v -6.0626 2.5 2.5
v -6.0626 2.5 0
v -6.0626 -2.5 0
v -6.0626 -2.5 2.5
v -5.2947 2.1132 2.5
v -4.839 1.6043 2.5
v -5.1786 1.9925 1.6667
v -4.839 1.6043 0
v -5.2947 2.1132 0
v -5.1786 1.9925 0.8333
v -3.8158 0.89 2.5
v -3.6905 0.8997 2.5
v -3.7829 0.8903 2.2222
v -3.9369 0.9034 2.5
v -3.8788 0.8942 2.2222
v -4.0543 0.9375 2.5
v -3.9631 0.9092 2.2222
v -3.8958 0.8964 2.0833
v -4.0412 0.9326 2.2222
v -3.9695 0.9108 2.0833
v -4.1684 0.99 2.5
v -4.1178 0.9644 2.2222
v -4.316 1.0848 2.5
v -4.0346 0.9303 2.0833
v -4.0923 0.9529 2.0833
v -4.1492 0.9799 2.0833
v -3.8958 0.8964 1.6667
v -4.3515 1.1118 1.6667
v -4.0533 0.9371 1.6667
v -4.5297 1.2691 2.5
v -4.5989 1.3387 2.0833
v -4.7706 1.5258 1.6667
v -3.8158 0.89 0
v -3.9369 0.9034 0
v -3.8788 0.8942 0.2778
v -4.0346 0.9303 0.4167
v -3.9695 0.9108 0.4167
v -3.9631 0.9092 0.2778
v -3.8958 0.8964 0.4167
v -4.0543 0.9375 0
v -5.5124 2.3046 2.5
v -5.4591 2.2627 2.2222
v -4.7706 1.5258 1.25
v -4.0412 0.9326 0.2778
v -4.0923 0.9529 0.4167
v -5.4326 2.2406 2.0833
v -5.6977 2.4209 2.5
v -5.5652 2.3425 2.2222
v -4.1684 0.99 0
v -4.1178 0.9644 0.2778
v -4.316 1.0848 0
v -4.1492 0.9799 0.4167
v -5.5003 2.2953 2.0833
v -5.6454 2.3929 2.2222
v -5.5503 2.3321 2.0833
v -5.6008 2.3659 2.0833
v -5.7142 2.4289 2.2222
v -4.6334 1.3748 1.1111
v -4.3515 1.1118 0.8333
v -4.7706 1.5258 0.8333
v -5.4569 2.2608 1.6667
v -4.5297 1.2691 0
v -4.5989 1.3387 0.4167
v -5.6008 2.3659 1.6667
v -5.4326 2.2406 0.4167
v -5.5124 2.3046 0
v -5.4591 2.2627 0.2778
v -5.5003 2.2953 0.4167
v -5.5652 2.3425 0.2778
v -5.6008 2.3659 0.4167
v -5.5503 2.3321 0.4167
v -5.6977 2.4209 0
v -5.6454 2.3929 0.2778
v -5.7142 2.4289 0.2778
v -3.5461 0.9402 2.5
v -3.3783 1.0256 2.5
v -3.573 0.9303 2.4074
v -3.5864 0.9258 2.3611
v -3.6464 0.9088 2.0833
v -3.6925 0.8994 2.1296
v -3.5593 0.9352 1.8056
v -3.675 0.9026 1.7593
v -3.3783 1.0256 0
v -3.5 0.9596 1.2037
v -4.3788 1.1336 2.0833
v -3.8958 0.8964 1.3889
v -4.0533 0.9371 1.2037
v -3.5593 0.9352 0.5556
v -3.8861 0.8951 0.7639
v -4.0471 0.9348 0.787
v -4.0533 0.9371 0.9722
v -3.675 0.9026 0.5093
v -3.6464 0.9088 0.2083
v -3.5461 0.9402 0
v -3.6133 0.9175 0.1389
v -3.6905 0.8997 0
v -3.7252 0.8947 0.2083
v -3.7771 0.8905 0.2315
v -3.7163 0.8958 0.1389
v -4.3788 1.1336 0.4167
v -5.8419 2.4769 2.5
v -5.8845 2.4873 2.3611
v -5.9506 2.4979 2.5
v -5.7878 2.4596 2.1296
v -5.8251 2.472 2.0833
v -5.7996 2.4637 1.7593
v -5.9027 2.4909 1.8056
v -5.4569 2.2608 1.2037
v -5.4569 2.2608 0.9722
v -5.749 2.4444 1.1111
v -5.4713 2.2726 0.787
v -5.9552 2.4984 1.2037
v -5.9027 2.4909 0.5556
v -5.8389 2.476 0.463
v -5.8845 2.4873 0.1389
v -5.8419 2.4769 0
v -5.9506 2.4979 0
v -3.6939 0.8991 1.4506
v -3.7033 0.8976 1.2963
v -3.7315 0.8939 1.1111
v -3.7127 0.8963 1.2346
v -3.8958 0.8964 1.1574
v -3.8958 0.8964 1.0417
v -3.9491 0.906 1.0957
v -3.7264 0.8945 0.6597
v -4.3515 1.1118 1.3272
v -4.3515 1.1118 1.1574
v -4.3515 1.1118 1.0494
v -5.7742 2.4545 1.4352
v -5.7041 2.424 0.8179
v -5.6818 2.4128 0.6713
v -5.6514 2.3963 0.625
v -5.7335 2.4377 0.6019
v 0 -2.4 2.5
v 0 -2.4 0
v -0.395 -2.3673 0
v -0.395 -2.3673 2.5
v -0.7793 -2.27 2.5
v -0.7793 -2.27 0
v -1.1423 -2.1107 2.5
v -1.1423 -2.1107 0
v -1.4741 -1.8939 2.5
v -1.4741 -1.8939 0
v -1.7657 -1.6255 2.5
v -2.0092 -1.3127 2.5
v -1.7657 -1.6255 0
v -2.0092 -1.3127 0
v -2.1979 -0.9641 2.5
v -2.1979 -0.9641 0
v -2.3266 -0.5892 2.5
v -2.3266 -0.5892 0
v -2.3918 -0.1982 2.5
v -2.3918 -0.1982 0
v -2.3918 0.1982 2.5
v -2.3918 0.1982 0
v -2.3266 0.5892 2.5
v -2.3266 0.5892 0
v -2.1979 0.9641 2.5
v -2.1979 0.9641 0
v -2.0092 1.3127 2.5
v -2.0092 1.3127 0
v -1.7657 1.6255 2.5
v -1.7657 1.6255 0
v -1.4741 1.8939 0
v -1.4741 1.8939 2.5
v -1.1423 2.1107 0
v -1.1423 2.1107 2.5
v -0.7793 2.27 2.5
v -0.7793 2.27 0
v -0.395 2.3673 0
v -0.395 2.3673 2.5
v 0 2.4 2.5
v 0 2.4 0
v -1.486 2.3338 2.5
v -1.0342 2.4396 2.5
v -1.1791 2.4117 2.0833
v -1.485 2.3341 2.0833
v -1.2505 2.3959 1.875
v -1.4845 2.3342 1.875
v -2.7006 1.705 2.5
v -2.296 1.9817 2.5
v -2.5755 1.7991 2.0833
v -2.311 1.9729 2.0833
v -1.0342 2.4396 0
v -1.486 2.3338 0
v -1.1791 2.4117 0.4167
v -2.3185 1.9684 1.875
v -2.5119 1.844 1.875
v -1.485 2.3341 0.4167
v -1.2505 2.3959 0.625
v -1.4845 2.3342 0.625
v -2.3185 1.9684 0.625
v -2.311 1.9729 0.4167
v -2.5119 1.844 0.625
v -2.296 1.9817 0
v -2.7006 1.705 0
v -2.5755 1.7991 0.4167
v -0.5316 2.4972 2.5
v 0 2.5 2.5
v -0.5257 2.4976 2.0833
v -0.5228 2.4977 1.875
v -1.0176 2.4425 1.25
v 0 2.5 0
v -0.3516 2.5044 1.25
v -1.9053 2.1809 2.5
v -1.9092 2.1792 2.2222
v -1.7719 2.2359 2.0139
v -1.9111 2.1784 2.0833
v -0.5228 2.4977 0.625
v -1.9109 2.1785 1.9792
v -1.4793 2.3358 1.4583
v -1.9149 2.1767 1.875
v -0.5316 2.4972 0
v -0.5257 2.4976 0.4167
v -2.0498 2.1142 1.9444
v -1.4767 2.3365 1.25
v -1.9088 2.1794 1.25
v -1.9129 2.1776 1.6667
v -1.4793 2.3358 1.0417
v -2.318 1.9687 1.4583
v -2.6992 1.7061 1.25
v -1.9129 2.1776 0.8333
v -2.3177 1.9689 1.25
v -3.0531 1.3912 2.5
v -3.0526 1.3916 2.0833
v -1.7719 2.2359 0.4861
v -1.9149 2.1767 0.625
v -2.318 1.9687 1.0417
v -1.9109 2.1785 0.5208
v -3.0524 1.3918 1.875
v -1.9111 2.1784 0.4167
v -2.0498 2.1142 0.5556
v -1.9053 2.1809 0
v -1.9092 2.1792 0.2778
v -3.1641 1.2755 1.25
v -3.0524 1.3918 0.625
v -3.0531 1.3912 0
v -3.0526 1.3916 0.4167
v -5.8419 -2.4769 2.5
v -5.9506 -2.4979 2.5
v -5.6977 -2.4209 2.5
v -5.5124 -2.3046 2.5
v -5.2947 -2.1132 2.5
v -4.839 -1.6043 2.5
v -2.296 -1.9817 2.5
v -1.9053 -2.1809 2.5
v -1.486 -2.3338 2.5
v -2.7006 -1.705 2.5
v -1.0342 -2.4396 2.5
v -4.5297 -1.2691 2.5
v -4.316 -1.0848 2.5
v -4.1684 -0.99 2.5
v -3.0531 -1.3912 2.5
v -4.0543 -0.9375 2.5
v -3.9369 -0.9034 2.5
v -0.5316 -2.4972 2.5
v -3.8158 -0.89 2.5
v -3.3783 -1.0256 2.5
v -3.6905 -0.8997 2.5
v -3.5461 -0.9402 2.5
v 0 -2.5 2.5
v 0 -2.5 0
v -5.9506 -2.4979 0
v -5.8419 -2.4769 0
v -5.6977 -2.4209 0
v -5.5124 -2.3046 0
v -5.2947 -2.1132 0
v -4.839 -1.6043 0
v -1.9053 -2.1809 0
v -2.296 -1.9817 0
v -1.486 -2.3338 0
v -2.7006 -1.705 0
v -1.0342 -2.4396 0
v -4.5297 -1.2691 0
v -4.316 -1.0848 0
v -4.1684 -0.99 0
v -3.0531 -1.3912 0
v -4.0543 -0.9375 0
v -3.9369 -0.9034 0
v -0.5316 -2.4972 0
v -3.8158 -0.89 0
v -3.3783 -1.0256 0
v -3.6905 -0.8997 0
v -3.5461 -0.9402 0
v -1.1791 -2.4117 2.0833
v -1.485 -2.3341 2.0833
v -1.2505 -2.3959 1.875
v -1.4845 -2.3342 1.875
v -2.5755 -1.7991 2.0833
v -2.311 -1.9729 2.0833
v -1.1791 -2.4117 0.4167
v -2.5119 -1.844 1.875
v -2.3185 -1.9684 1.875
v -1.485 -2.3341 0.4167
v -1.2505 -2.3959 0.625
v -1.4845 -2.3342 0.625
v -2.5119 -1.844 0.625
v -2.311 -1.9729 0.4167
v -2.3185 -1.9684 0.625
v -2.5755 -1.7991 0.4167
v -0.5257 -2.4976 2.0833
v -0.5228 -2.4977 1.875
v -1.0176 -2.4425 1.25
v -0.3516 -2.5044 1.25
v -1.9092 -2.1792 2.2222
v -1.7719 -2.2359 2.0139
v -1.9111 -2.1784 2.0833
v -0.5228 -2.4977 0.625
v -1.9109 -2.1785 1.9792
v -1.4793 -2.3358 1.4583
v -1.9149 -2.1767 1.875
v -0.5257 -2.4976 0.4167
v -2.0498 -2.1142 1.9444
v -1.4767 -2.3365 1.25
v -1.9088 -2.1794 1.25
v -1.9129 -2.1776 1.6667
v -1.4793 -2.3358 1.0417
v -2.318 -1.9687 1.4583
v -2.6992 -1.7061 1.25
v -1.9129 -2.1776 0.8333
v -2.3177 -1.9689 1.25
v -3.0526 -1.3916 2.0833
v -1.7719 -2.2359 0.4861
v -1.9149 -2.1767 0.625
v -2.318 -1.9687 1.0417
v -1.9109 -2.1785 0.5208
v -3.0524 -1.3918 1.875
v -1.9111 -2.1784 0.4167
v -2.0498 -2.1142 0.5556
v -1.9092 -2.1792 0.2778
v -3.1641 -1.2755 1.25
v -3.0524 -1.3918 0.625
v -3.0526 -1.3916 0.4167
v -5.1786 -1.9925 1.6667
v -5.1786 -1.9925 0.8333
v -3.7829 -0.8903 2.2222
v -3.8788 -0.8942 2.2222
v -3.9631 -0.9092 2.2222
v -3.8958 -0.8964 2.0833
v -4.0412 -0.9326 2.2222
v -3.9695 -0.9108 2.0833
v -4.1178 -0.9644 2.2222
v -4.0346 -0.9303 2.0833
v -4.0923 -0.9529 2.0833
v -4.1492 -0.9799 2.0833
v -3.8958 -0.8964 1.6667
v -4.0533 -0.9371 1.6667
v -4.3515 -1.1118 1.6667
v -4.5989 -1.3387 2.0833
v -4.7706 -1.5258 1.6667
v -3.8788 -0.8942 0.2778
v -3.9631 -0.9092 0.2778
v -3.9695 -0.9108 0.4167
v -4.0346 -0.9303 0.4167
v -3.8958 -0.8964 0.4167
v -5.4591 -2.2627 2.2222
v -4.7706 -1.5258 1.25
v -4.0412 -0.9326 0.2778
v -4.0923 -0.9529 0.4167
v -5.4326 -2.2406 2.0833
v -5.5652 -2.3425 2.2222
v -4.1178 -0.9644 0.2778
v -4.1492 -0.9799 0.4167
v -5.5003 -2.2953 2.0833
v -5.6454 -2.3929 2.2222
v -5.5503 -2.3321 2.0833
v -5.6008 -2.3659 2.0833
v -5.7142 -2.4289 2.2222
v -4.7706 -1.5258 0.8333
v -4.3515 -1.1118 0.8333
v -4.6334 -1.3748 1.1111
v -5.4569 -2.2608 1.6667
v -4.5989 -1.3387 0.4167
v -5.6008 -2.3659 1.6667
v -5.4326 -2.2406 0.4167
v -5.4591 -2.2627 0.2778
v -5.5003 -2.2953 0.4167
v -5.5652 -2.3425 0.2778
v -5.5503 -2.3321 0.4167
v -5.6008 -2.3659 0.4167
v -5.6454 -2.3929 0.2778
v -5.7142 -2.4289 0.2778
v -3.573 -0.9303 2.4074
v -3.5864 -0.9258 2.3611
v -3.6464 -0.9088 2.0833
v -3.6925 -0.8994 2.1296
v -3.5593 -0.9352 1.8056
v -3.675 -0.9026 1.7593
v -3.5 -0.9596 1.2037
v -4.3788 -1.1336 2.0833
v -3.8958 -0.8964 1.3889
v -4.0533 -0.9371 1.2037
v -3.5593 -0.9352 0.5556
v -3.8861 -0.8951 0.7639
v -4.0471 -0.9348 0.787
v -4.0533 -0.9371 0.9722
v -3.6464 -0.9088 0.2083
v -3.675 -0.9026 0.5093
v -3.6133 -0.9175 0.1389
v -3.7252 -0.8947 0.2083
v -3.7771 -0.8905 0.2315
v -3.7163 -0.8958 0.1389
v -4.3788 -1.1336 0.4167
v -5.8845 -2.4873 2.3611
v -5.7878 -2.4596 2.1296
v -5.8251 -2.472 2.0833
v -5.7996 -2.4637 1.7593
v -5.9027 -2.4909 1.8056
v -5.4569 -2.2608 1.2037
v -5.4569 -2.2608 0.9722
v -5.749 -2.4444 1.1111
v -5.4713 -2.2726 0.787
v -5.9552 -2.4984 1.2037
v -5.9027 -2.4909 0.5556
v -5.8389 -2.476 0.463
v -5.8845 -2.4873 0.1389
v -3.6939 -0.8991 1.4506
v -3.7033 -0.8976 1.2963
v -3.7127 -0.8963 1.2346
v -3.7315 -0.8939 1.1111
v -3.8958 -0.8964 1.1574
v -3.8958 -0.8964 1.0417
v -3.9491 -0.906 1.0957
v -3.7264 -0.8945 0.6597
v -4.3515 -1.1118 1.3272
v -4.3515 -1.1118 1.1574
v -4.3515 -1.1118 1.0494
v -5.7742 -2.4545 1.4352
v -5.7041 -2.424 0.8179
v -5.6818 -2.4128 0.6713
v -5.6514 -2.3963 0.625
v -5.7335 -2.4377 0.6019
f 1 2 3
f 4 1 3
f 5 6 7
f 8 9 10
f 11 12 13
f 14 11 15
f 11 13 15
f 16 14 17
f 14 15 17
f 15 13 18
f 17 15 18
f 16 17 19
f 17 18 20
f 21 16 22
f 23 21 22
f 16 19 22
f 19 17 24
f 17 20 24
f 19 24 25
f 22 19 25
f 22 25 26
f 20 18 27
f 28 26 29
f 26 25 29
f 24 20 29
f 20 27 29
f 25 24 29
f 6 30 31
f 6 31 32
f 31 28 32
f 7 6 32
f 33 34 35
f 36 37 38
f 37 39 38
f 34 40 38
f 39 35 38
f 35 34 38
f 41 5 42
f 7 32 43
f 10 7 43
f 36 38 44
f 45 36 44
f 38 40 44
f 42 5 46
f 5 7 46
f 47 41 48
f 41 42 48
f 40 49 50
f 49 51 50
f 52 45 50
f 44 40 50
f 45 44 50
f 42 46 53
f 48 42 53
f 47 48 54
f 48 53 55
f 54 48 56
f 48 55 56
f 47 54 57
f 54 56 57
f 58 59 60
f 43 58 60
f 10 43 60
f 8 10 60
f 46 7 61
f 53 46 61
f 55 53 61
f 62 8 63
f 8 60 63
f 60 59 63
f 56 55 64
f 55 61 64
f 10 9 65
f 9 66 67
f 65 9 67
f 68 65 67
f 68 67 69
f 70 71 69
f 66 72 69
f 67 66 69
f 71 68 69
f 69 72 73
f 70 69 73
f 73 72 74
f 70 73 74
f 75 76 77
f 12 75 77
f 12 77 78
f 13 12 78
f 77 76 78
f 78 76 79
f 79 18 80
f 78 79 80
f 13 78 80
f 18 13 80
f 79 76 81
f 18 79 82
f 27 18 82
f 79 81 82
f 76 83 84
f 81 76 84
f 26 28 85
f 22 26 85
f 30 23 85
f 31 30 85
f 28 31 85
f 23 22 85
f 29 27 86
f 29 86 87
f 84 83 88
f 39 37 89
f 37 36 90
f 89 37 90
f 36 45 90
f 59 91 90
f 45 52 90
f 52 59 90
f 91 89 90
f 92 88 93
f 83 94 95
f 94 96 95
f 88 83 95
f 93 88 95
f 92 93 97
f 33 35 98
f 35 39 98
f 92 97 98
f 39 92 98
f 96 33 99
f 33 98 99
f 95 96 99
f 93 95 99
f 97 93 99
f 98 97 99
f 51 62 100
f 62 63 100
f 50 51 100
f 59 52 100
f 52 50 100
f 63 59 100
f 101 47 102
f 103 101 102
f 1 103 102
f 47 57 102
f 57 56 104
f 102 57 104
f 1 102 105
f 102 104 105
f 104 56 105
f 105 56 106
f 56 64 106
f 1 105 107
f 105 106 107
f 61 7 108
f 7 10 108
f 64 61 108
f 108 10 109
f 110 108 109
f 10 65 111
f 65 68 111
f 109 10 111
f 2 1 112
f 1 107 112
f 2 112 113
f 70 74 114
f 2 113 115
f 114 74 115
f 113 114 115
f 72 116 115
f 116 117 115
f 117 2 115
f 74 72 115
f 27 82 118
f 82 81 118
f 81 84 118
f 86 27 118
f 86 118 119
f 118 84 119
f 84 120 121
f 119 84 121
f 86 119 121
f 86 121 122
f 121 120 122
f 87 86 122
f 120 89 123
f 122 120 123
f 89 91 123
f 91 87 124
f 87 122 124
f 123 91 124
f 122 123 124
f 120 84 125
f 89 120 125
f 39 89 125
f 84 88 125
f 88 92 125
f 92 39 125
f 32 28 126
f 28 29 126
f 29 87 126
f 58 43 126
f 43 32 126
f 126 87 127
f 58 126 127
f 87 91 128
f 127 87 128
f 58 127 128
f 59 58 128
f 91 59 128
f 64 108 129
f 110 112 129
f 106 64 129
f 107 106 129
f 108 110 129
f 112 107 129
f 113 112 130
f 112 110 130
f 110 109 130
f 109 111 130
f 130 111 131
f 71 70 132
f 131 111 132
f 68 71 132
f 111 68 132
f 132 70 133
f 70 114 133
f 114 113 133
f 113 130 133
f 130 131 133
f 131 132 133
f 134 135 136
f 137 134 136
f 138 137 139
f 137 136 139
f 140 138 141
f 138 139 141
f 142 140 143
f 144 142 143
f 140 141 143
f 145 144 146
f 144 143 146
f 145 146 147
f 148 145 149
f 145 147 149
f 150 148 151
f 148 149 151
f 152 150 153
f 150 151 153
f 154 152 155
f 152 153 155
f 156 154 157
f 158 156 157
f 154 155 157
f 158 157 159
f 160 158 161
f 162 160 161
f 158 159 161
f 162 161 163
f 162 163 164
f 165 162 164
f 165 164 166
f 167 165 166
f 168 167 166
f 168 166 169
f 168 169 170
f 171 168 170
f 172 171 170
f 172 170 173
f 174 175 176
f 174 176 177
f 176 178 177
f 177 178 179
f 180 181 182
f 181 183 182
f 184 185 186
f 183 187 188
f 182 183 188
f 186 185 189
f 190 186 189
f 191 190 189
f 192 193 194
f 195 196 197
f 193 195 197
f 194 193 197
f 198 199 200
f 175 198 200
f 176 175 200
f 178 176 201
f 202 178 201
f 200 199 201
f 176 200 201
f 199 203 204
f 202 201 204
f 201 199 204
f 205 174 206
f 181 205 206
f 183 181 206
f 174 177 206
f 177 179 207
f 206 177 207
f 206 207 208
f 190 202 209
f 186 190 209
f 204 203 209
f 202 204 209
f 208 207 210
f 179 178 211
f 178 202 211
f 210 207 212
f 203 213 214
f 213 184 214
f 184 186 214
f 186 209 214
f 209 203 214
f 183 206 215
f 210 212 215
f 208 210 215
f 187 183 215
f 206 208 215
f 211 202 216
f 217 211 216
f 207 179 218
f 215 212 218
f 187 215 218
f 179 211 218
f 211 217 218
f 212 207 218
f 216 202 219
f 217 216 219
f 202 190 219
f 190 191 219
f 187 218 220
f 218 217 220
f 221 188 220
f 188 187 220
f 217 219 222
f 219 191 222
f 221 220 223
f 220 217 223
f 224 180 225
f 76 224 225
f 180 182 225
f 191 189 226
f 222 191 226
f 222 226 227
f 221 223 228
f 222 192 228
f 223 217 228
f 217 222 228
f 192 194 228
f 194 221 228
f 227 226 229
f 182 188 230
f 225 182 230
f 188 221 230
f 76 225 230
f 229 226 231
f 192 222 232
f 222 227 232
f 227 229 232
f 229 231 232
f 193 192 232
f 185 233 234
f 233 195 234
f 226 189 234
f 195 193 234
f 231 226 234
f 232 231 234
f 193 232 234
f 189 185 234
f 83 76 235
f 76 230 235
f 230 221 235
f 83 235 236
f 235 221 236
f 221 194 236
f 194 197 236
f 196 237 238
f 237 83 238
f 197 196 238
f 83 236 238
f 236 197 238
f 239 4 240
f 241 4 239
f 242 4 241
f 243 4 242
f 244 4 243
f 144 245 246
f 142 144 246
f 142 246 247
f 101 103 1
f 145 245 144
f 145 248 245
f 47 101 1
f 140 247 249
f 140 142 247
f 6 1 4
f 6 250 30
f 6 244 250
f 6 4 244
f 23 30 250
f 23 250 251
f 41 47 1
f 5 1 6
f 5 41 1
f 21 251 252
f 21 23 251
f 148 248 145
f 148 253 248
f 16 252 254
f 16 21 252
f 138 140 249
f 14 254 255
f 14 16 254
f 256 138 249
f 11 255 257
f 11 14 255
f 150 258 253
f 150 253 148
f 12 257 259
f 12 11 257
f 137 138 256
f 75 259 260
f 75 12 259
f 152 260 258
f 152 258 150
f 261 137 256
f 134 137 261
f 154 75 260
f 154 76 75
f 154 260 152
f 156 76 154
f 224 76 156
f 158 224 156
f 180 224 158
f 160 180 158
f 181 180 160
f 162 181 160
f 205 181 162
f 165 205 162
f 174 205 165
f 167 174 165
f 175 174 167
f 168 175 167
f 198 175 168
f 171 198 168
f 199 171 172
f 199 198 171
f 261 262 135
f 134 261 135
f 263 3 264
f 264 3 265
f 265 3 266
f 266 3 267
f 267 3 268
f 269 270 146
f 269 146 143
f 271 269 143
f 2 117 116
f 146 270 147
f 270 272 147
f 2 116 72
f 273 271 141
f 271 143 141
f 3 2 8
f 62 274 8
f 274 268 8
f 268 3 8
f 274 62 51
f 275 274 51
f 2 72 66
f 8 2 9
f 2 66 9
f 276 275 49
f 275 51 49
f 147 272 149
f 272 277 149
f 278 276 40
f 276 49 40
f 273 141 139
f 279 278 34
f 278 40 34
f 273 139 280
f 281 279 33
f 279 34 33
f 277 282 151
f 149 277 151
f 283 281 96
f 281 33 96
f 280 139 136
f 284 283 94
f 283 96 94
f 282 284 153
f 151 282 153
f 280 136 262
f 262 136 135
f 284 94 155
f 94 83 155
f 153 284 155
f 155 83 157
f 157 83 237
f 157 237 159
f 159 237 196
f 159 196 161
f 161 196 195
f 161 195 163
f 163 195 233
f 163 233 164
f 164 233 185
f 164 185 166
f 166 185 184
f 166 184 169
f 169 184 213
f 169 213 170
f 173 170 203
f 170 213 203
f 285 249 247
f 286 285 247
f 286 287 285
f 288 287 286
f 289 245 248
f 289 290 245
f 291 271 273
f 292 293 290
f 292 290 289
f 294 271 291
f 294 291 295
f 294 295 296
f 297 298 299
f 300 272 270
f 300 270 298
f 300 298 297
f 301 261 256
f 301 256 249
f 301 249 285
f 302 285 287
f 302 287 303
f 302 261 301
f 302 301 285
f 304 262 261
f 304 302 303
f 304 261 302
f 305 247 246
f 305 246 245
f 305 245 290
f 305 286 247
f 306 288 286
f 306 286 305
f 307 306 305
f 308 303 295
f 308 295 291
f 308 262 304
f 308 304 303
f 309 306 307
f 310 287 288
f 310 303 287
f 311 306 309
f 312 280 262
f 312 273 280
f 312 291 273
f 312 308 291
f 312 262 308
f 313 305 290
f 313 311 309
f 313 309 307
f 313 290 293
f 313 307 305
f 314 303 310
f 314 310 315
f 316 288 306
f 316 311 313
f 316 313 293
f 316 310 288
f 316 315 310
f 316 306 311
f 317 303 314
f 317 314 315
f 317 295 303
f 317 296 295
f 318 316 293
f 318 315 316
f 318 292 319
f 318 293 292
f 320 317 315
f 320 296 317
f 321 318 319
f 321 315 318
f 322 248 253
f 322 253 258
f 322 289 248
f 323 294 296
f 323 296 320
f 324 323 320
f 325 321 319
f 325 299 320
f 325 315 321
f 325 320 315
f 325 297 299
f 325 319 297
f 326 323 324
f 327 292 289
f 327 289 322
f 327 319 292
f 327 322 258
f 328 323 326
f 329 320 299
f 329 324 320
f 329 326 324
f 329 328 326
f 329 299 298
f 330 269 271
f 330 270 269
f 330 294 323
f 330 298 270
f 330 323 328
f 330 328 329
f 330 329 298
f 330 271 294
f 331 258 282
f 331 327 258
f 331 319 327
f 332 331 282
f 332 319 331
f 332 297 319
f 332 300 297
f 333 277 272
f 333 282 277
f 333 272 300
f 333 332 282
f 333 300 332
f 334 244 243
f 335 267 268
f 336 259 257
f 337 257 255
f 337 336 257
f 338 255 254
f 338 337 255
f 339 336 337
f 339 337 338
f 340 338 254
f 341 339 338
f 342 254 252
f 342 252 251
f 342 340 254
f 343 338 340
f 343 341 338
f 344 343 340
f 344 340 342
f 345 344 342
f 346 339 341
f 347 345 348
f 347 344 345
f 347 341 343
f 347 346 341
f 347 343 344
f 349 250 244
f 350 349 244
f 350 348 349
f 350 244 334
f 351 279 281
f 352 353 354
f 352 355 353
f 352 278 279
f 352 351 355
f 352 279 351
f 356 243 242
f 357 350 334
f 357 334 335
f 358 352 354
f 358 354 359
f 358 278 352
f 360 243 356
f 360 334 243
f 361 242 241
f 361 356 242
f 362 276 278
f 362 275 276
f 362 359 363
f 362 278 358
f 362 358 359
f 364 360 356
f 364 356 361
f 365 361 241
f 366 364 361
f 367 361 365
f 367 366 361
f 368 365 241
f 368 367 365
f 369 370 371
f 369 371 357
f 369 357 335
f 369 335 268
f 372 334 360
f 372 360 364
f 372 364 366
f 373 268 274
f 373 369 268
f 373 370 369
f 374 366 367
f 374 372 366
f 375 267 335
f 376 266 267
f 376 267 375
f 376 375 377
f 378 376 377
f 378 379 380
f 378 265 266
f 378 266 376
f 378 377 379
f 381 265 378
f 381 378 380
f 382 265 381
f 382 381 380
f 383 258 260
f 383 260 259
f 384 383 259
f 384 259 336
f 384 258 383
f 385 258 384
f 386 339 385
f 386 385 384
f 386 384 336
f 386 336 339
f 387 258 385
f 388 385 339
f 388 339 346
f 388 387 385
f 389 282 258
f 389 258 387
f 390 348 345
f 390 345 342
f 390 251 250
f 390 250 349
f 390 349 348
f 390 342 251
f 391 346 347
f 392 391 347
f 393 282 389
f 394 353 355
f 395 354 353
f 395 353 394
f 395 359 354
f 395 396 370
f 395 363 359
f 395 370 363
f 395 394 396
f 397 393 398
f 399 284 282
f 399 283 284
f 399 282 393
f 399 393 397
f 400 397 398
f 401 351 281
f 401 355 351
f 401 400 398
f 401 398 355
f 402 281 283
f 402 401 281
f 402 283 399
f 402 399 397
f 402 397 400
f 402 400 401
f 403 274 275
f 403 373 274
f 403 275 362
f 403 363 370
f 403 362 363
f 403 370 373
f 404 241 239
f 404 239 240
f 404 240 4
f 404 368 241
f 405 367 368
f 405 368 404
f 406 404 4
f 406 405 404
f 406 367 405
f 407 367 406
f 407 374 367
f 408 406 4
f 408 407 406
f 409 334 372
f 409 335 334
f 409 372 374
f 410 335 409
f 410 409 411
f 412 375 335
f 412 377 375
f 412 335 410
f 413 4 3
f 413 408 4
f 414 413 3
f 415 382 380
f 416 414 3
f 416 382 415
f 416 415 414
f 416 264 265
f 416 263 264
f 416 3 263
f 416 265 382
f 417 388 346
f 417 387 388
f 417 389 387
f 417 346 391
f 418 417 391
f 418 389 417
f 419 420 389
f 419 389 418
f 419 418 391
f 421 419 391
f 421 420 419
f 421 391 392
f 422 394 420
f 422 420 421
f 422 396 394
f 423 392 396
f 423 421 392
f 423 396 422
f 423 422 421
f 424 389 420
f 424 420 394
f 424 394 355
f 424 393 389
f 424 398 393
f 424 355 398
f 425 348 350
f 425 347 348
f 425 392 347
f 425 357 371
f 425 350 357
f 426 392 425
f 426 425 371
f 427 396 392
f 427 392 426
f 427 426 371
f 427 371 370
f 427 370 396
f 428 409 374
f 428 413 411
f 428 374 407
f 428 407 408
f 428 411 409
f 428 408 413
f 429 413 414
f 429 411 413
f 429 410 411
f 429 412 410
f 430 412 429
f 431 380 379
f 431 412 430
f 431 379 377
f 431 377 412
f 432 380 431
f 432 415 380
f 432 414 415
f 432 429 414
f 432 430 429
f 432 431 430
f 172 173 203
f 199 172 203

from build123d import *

# Parameters (mm, degrees)
BOSS_EXTRUDE1_DEPTH = 2.5


with BuildPart() as part:
    # Sketch1 → Boss-Extrude1 (new body)
    with BuildSketch(Plane.XY):
        with BuildLine():
            Line((-6.062552239, 2.5), (-6.062552239, -2.5))
            add(Edge.make_bspline(
                [(-3.378314474, -1.025559537), (-4.49216768, -0.325238314), (-5.082460235, -2.568455815), (-6.062552239, -2.5)],
                knots=[0, 0, 0, 0, 1, 1, 1, 1], degree=3))
            add(Edge.make_bspline(
                [(0, -2.5), (-2.128381344, -2.596064875), (-3.378314474, -1.025559537)],
                knots=[0, 0, 0, 1, 1, 1], degree=2))
            Line((0, -2.5), (0, -2.4))
            ThreePointArc((0, -2.4), (-2.4, 0), (0, 2.4))
            Line((0, 2.4), (0, 2.5))
            add(Edge.make_bspline(
                [(0, 2.5), (-2.128381344, 2.596064875), (-3.378314474, 1.025559537)],
                knots=[0, 0, 0, 1, 1, 1], degree=2))
            add(Edge.make_bspline(
                [(-3.378314474, 1.025559537), (-4.49216768, 0.325238314), (-5.082460235, 2.568455815), (-6.062552239, 2.5)],
                knots=[0, 0, 0, 0, 1, 1, 1, 1], degree=3))
        make_face()
    extrude(amount=BOSS_EXTRUDE1_DEPTH)


solid = part.part
